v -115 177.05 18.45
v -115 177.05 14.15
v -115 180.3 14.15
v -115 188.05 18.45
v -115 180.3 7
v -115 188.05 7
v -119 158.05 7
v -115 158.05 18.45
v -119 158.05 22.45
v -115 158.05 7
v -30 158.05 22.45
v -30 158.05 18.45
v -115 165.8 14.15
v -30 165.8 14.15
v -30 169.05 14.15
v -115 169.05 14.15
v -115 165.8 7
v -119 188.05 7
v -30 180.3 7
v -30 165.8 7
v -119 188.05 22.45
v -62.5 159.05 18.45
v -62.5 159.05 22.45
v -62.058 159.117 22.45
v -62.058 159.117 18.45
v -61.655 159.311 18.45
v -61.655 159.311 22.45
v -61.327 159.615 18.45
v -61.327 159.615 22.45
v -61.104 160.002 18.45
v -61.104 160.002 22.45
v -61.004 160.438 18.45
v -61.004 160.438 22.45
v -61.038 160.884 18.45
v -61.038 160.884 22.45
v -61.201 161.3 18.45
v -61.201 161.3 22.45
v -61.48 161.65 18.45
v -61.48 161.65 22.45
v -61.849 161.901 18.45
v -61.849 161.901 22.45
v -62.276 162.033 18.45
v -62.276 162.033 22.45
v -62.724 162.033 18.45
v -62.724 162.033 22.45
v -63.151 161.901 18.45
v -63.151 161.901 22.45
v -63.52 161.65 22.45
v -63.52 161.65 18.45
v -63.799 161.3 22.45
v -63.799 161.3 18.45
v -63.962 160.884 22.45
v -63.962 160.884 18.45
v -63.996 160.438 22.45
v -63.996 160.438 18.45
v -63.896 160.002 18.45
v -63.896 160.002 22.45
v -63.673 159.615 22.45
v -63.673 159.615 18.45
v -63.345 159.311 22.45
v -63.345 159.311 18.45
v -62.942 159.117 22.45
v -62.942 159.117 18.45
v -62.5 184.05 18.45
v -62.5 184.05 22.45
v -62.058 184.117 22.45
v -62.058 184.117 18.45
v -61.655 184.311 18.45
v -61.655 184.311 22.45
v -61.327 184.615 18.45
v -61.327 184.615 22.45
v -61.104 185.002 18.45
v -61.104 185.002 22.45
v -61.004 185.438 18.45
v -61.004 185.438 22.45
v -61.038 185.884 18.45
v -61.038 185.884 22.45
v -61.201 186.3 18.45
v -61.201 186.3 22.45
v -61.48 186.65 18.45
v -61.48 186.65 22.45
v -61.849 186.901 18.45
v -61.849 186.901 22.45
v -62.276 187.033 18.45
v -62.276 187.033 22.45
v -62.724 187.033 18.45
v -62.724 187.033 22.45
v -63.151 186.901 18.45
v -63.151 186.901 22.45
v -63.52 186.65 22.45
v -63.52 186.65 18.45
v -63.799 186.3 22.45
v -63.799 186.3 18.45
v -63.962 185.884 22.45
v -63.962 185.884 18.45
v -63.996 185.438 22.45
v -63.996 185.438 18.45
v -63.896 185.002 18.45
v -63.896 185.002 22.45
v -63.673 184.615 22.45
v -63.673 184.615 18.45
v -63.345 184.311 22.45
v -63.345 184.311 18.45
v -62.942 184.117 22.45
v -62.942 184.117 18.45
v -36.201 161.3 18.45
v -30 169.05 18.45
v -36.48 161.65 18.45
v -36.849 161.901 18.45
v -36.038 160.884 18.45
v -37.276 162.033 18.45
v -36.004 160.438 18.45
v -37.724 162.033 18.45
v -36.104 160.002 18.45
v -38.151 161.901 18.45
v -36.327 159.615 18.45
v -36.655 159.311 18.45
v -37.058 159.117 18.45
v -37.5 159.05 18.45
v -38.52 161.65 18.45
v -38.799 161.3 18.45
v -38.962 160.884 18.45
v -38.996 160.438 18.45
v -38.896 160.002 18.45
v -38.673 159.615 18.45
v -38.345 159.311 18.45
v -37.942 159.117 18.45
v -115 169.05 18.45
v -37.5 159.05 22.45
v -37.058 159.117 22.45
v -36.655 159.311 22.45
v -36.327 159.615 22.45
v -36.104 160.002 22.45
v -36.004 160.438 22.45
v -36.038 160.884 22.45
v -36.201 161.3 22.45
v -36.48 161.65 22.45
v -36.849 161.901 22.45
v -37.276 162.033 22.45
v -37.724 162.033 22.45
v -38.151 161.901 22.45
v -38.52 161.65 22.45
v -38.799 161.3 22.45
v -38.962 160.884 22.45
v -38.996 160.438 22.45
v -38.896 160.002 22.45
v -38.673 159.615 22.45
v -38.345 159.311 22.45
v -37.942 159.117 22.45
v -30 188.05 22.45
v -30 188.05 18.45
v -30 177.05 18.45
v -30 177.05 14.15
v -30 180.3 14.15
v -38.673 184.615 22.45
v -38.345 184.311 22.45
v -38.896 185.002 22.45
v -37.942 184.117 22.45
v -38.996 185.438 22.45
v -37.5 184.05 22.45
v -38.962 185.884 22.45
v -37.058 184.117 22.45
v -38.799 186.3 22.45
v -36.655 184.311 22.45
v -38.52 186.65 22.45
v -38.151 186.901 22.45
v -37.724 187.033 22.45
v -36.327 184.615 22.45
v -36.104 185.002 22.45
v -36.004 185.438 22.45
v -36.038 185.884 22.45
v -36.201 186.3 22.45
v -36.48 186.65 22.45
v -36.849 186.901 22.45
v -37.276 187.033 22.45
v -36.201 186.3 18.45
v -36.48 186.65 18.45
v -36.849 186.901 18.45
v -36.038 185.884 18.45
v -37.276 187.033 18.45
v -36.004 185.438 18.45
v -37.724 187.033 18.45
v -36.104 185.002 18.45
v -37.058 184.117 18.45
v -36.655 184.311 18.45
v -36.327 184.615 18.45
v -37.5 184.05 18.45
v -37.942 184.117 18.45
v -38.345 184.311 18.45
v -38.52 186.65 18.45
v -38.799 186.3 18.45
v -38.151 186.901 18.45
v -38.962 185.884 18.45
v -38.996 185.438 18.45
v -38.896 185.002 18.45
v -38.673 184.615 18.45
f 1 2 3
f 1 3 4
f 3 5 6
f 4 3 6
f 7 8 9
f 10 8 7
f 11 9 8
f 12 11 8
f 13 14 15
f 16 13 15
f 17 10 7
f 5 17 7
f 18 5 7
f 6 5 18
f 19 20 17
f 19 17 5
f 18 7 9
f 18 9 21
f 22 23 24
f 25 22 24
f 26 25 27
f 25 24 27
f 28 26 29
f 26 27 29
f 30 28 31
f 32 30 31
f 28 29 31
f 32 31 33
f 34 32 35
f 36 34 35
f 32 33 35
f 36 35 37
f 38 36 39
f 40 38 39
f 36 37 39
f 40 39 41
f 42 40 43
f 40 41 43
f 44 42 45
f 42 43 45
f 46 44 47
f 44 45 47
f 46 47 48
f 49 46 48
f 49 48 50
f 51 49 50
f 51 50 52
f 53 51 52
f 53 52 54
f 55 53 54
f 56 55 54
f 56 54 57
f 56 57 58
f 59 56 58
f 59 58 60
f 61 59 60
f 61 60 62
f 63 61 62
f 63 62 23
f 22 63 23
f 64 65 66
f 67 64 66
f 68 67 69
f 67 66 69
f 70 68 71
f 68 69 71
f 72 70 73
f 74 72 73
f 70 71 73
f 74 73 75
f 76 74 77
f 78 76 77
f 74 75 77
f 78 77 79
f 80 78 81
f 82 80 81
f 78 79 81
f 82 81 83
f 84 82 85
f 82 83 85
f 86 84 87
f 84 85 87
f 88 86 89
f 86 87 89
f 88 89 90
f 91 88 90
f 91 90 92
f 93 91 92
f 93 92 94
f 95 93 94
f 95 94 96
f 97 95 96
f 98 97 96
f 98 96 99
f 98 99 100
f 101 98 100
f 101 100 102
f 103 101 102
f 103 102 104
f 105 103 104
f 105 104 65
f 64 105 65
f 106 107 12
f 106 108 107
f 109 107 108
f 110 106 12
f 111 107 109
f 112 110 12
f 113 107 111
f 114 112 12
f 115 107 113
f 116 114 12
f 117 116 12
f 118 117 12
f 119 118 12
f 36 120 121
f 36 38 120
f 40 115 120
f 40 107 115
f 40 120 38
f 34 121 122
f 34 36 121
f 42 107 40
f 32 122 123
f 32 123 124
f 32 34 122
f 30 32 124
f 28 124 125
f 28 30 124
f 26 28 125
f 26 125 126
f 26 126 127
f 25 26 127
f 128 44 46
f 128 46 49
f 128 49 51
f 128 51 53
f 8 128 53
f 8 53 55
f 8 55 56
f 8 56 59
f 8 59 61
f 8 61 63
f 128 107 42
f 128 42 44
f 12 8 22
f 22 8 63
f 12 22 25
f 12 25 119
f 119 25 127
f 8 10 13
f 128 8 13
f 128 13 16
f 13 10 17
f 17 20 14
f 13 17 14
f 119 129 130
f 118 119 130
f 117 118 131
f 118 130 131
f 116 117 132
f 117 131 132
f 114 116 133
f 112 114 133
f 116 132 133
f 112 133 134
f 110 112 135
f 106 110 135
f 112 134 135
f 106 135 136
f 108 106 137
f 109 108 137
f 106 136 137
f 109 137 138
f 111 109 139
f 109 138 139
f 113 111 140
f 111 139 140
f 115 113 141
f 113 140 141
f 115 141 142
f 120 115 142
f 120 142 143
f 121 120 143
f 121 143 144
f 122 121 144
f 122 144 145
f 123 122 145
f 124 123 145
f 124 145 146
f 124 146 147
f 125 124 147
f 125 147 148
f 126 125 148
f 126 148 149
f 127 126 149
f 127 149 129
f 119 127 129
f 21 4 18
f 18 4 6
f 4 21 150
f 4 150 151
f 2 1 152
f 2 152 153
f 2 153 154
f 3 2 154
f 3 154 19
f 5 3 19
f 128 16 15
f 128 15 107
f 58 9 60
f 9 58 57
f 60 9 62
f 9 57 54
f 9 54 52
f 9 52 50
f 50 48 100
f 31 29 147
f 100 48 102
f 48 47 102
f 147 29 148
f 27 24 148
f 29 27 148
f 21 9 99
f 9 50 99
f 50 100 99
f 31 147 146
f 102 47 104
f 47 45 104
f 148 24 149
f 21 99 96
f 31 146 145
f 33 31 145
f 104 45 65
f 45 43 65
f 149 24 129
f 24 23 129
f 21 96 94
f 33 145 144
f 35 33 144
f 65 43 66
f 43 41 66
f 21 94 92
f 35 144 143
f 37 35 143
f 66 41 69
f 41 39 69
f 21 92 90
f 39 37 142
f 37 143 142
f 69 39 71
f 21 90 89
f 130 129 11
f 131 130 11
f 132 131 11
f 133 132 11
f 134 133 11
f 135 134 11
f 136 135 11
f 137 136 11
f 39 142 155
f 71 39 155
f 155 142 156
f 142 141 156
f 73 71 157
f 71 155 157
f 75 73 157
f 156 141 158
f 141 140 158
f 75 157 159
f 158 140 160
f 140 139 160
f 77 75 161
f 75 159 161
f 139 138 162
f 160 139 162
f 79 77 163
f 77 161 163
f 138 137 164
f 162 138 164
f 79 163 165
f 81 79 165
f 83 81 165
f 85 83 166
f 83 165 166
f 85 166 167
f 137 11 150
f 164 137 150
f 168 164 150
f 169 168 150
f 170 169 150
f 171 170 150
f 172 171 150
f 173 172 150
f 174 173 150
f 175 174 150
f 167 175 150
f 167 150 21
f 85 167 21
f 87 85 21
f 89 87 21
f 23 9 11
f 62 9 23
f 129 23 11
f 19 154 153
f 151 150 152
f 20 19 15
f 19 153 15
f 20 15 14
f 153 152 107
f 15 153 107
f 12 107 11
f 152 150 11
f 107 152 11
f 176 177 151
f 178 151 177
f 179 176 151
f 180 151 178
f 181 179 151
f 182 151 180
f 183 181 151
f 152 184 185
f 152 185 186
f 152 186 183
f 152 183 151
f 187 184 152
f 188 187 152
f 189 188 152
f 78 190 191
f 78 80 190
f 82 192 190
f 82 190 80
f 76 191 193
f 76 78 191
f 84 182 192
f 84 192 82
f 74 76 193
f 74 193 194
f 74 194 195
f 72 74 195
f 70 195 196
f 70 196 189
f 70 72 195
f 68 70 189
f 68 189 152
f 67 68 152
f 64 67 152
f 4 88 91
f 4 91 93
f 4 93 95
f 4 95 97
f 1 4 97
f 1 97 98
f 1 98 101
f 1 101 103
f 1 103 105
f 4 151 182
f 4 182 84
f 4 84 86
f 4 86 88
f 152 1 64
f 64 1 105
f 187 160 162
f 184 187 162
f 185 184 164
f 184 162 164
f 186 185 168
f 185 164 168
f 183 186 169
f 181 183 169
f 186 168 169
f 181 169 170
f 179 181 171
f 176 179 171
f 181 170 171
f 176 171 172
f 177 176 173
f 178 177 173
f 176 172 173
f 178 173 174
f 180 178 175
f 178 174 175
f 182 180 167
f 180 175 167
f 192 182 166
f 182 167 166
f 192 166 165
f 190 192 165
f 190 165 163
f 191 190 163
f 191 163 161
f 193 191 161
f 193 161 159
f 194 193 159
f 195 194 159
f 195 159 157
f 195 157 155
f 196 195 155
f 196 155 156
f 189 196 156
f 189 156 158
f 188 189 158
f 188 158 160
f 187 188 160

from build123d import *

# Parameters (mm, degrees)
PAD113_DEPTH    = 85
SKETCH229_R     = 1.5
POCKET082_DEPTH = 15.451
SKETCH230_W     = 30
SKETCH230_H     = 15.45
PAD114_DEPTH    = 4


with BuildPart() as part:
    # Sketch228 → Pad113 (new body)
    with BuildSketch(Plane.YZ):
        Polygon((-7.75, 11.45), (-7.75, 15.45), (22.25, 15.45), (22.25, 11.45), (11.25, 11.45), (11.25, 7.15), (14.5, 7.15), (14.5, 0), (0, 0), (0, 7.15), (3.25, 7.15), (3.25, 11.45), align=None)
    extrude(amount=PAD113_DEPTH)

    # Sketch229 (on Face2 of Pad113) → Pocket082 (cut, through all)
    with BuildSketch(Plane(origin=(0, 0, 15.45), x_dir=(0, -1, 0), z_dir=(0, 0, 1))):
        with Locations((-19.75, 77.5)):
            Circle(SKETCH229_R)
        with Locations((-19.75, 52.5)):
            Circle(SKETCH229_R)
        with Locations((5.25, 52.5)):
            Circle(SKETCH229_R)
        with Locations((5.25, 77.5)):
            Circle(SKETCH229_R)
    extrude(amount=-POCKET082_DEPTH, mode=Mode.SUBTRACT)

    # Sketch230 (on Face4 of Pocket082) → Pad114 (join)
    with BuildSketch(Plane(origin=(0, 0, 0), x_dir=(0, 1, 0), z_dir=(-1, 0, 0))):
        with Locations((7.25, -7.725)):
            Rectangle(SKETCH230_W, SKETCH230_H)
    extrude(amount=PAD114_DEPTH)


with BuildPart() as part_1:
    # Body136 placement: moved
    add(part.part.moved(Location((-115, 165.8, 7))))


solid = part_1.part
